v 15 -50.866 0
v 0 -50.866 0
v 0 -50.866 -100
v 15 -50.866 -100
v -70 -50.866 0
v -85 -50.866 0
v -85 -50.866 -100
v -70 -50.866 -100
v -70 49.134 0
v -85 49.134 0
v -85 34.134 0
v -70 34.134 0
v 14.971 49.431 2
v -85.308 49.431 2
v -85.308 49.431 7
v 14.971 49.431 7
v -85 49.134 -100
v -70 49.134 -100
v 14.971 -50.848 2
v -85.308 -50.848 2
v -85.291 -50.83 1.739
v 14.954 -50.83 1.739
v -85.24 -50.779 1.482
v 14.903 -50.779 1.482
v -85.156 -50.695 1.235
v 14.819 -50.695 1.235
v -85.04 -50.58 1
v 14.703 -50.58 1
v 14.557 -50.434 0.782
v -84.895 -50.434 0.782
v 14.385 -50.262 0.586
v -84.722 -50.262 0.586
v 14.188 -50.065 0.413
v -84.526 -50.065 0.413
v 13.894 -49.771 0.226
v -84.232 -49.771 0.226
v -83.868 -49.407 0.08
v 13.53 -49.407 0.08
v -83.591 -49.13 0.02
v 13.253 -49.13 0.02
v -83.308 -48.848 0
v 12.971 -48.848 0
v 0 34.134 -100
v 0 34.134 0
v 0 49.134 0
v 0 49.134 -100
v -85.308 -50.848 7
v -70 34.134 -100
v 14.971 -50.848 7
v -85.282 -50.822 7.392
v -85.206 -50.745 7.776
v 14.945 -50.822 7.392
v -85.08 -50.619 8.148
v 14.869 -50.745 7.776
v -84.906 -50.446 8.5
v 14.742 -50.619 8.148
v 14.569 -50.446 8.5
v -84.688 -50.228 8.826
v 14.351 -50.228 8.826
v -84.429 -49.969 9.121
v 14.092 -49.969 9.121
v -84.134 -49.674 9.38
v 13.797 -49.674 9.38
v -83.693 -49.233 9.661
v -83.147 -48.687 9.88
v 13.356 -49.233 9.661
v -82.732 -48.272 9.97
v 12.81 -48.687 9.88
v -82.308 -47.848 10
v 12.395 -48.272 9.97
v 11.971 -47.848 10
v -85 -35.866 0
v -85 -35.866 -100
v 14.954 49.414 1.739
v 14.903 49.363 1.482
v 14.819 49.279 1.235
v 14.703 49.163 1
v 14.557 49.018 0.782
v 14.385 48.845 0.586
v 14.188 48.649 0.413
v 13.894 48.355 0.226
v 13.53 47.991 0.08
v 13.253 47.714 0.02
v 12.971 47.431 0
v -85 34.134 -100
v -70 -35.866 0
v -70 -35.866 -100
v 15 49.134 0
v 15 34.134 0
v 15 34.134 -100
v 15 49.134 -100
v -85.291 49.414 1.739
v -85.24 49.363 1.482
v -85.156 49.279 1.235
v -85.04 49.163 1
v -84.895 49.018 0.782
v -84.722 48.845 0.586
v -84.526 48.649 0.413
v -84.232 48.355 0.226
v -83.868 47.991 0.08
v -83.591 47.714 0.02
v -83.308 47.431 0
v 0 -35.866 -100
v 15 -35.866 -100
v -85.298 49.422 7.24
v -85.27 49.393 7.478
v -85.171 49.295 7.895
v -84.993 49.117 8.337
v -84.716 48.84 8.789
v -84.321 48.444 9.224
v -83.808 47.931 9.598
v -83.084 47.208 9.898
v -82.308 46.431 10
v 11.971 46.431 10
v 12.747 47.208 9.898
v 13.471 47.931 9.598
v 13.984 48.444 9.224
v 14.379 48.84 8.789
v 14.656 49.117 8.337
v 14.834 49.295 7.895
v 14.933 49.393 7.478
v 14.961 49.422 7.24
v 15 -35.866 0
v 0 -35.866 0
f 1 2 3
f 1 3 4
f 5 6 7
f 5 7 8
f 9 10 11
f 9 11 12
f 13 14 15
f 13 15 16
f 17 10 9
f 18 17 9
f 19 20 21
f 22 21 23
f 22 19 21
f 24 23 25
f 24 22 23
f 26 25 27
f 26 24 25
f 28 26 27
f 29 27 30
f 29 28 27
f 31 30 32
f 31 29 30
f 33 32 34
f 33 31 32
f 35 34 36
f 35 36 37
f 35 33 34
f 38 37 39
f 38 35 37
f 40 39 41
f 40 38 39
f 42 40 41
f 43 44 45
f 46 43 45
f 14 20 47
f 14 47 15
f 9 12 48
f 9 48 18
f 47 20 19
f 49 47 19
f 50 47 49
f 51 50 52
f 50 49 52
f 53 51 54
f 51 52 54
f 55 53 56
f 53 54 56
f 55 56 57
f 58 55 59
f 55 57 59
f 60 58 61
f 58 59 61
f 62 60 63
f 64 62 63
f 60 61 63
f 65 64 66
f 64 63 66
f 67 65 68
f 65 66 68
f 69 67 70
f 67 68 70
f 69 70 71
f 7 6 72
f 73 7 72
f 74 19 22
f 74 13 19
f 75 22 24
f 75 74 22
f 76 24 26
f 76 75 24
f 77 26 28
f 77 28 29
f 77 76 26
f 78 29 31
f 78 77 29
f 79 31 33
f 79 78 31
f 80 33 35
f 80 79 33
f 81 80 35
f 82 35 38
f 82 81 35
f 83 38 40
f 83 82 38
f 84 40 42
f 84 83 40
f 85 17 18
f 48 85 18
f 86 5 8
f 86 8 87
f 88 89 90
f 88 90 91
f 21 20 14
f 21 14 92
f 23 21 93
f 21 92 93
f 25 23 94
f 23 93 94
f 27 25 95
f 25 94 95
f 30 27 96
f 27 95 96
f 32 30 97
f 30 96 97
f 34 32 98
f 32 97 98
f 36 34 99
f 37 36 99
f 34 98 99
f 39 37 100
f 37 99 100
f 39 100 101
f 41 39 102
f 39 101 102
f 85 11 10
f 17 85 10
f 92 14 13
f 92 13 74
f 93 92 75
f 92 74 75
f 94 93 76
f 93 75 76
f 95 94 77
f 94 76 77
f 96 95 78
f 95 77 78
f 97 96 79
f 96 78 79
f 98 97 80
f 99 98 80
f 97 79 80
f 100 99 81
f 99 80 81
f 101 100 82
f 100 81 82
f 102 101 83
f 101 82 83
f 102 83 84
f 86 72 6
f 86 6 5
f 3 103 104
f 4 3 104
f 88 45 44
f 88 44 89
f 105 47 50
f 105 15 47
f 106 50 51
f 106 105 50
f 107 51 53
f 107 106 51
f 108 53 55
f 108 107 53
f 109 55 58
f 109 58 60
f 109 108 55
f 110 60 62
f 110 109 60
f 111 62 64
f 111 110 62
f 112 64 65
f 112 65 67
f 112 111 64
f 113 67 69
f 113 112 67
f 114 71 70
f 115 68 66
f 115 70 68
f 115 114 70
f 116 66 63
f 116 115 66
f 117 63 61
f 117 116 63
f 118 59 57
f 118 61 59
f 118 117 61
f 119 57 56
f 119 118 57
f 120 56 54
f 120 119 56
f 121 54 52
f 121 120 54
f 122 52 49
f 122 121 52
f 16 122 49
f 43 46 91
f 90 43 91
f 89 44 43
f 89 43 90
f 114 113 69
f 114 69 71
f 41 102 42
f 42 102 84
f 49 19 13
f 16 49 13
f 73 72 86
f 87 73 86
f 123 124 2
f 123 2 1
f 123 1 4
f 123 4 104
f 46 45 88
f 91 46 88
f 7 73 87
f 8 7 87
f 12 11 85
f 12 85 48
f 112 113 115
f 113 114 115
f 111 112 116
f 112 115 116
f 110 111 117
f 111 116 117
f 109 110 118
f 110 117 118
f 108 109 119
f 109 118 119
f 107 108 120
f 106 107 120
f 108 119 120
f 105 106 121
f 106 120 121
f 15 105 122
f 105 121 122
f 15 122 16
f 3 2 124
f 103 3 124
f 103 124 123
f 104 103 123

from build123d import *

# Parameters (mm, degrees)
F0_W     = 15
F0_H     = 15
F1_DEPTH = 100
F2_W     = 100.278782
F2_H     = 100.27878
F3_DEPTH = 10
F4_R     = 2
F5_R     = 3


with BuildPart() as f1:
    # F0 (on Top) → F1 (new body)
    with BuildSketch(Plane.XY):
        with Locations((-77.5, 41.634444)):
            Rectangle(F0_W, F0_H)
        with Locations((-77.5, -43.365556)):
            Rectangle(F0_W, F0_H)
        with Locations((7.5, 41.634444)):
            Rectangle(F0_W, F0_H)
        with Locations((7.5, -43.365556)):
            Rectangle(F0_W, F0_H)
    extrude(amount=-F1_DEPTH)


with BuildPart() as f3:
    # F2 (on Top) → F3 (new body)
    with BuildSketch(Plane.XY):
        with Locations((-35.168617, -0.708185)):
            Rectangle(F2_W, F2_H)
    extrude(amount=F3_DEPTH)

    # F4
    f4_edges = [f3.edges().sort_by_distance(p)[0] for p in [
        (-85.308008, -0.708185, 0),
        (-35.168617, 49.431205, 0),
        (-35.168617, -50.847575, 0),
        (14.970774, -0.708185, 0),
    ]]
    fillet(f4_edges, radius=F4_R)

    # F5
    f5_edges = [f3.edges().sort_by_distance(p)[0] for p in [
        (-35.168617, 49.431205, 10),
        (-85.308008, -0.708185, 10),
        (-35.168617, -50.847575, 10),
        (14.970774, -0.708185, 10),
    ]]
    fillet(f5_edges, radius=F5_R)


solid = Compound([f1.part, f3.part])
